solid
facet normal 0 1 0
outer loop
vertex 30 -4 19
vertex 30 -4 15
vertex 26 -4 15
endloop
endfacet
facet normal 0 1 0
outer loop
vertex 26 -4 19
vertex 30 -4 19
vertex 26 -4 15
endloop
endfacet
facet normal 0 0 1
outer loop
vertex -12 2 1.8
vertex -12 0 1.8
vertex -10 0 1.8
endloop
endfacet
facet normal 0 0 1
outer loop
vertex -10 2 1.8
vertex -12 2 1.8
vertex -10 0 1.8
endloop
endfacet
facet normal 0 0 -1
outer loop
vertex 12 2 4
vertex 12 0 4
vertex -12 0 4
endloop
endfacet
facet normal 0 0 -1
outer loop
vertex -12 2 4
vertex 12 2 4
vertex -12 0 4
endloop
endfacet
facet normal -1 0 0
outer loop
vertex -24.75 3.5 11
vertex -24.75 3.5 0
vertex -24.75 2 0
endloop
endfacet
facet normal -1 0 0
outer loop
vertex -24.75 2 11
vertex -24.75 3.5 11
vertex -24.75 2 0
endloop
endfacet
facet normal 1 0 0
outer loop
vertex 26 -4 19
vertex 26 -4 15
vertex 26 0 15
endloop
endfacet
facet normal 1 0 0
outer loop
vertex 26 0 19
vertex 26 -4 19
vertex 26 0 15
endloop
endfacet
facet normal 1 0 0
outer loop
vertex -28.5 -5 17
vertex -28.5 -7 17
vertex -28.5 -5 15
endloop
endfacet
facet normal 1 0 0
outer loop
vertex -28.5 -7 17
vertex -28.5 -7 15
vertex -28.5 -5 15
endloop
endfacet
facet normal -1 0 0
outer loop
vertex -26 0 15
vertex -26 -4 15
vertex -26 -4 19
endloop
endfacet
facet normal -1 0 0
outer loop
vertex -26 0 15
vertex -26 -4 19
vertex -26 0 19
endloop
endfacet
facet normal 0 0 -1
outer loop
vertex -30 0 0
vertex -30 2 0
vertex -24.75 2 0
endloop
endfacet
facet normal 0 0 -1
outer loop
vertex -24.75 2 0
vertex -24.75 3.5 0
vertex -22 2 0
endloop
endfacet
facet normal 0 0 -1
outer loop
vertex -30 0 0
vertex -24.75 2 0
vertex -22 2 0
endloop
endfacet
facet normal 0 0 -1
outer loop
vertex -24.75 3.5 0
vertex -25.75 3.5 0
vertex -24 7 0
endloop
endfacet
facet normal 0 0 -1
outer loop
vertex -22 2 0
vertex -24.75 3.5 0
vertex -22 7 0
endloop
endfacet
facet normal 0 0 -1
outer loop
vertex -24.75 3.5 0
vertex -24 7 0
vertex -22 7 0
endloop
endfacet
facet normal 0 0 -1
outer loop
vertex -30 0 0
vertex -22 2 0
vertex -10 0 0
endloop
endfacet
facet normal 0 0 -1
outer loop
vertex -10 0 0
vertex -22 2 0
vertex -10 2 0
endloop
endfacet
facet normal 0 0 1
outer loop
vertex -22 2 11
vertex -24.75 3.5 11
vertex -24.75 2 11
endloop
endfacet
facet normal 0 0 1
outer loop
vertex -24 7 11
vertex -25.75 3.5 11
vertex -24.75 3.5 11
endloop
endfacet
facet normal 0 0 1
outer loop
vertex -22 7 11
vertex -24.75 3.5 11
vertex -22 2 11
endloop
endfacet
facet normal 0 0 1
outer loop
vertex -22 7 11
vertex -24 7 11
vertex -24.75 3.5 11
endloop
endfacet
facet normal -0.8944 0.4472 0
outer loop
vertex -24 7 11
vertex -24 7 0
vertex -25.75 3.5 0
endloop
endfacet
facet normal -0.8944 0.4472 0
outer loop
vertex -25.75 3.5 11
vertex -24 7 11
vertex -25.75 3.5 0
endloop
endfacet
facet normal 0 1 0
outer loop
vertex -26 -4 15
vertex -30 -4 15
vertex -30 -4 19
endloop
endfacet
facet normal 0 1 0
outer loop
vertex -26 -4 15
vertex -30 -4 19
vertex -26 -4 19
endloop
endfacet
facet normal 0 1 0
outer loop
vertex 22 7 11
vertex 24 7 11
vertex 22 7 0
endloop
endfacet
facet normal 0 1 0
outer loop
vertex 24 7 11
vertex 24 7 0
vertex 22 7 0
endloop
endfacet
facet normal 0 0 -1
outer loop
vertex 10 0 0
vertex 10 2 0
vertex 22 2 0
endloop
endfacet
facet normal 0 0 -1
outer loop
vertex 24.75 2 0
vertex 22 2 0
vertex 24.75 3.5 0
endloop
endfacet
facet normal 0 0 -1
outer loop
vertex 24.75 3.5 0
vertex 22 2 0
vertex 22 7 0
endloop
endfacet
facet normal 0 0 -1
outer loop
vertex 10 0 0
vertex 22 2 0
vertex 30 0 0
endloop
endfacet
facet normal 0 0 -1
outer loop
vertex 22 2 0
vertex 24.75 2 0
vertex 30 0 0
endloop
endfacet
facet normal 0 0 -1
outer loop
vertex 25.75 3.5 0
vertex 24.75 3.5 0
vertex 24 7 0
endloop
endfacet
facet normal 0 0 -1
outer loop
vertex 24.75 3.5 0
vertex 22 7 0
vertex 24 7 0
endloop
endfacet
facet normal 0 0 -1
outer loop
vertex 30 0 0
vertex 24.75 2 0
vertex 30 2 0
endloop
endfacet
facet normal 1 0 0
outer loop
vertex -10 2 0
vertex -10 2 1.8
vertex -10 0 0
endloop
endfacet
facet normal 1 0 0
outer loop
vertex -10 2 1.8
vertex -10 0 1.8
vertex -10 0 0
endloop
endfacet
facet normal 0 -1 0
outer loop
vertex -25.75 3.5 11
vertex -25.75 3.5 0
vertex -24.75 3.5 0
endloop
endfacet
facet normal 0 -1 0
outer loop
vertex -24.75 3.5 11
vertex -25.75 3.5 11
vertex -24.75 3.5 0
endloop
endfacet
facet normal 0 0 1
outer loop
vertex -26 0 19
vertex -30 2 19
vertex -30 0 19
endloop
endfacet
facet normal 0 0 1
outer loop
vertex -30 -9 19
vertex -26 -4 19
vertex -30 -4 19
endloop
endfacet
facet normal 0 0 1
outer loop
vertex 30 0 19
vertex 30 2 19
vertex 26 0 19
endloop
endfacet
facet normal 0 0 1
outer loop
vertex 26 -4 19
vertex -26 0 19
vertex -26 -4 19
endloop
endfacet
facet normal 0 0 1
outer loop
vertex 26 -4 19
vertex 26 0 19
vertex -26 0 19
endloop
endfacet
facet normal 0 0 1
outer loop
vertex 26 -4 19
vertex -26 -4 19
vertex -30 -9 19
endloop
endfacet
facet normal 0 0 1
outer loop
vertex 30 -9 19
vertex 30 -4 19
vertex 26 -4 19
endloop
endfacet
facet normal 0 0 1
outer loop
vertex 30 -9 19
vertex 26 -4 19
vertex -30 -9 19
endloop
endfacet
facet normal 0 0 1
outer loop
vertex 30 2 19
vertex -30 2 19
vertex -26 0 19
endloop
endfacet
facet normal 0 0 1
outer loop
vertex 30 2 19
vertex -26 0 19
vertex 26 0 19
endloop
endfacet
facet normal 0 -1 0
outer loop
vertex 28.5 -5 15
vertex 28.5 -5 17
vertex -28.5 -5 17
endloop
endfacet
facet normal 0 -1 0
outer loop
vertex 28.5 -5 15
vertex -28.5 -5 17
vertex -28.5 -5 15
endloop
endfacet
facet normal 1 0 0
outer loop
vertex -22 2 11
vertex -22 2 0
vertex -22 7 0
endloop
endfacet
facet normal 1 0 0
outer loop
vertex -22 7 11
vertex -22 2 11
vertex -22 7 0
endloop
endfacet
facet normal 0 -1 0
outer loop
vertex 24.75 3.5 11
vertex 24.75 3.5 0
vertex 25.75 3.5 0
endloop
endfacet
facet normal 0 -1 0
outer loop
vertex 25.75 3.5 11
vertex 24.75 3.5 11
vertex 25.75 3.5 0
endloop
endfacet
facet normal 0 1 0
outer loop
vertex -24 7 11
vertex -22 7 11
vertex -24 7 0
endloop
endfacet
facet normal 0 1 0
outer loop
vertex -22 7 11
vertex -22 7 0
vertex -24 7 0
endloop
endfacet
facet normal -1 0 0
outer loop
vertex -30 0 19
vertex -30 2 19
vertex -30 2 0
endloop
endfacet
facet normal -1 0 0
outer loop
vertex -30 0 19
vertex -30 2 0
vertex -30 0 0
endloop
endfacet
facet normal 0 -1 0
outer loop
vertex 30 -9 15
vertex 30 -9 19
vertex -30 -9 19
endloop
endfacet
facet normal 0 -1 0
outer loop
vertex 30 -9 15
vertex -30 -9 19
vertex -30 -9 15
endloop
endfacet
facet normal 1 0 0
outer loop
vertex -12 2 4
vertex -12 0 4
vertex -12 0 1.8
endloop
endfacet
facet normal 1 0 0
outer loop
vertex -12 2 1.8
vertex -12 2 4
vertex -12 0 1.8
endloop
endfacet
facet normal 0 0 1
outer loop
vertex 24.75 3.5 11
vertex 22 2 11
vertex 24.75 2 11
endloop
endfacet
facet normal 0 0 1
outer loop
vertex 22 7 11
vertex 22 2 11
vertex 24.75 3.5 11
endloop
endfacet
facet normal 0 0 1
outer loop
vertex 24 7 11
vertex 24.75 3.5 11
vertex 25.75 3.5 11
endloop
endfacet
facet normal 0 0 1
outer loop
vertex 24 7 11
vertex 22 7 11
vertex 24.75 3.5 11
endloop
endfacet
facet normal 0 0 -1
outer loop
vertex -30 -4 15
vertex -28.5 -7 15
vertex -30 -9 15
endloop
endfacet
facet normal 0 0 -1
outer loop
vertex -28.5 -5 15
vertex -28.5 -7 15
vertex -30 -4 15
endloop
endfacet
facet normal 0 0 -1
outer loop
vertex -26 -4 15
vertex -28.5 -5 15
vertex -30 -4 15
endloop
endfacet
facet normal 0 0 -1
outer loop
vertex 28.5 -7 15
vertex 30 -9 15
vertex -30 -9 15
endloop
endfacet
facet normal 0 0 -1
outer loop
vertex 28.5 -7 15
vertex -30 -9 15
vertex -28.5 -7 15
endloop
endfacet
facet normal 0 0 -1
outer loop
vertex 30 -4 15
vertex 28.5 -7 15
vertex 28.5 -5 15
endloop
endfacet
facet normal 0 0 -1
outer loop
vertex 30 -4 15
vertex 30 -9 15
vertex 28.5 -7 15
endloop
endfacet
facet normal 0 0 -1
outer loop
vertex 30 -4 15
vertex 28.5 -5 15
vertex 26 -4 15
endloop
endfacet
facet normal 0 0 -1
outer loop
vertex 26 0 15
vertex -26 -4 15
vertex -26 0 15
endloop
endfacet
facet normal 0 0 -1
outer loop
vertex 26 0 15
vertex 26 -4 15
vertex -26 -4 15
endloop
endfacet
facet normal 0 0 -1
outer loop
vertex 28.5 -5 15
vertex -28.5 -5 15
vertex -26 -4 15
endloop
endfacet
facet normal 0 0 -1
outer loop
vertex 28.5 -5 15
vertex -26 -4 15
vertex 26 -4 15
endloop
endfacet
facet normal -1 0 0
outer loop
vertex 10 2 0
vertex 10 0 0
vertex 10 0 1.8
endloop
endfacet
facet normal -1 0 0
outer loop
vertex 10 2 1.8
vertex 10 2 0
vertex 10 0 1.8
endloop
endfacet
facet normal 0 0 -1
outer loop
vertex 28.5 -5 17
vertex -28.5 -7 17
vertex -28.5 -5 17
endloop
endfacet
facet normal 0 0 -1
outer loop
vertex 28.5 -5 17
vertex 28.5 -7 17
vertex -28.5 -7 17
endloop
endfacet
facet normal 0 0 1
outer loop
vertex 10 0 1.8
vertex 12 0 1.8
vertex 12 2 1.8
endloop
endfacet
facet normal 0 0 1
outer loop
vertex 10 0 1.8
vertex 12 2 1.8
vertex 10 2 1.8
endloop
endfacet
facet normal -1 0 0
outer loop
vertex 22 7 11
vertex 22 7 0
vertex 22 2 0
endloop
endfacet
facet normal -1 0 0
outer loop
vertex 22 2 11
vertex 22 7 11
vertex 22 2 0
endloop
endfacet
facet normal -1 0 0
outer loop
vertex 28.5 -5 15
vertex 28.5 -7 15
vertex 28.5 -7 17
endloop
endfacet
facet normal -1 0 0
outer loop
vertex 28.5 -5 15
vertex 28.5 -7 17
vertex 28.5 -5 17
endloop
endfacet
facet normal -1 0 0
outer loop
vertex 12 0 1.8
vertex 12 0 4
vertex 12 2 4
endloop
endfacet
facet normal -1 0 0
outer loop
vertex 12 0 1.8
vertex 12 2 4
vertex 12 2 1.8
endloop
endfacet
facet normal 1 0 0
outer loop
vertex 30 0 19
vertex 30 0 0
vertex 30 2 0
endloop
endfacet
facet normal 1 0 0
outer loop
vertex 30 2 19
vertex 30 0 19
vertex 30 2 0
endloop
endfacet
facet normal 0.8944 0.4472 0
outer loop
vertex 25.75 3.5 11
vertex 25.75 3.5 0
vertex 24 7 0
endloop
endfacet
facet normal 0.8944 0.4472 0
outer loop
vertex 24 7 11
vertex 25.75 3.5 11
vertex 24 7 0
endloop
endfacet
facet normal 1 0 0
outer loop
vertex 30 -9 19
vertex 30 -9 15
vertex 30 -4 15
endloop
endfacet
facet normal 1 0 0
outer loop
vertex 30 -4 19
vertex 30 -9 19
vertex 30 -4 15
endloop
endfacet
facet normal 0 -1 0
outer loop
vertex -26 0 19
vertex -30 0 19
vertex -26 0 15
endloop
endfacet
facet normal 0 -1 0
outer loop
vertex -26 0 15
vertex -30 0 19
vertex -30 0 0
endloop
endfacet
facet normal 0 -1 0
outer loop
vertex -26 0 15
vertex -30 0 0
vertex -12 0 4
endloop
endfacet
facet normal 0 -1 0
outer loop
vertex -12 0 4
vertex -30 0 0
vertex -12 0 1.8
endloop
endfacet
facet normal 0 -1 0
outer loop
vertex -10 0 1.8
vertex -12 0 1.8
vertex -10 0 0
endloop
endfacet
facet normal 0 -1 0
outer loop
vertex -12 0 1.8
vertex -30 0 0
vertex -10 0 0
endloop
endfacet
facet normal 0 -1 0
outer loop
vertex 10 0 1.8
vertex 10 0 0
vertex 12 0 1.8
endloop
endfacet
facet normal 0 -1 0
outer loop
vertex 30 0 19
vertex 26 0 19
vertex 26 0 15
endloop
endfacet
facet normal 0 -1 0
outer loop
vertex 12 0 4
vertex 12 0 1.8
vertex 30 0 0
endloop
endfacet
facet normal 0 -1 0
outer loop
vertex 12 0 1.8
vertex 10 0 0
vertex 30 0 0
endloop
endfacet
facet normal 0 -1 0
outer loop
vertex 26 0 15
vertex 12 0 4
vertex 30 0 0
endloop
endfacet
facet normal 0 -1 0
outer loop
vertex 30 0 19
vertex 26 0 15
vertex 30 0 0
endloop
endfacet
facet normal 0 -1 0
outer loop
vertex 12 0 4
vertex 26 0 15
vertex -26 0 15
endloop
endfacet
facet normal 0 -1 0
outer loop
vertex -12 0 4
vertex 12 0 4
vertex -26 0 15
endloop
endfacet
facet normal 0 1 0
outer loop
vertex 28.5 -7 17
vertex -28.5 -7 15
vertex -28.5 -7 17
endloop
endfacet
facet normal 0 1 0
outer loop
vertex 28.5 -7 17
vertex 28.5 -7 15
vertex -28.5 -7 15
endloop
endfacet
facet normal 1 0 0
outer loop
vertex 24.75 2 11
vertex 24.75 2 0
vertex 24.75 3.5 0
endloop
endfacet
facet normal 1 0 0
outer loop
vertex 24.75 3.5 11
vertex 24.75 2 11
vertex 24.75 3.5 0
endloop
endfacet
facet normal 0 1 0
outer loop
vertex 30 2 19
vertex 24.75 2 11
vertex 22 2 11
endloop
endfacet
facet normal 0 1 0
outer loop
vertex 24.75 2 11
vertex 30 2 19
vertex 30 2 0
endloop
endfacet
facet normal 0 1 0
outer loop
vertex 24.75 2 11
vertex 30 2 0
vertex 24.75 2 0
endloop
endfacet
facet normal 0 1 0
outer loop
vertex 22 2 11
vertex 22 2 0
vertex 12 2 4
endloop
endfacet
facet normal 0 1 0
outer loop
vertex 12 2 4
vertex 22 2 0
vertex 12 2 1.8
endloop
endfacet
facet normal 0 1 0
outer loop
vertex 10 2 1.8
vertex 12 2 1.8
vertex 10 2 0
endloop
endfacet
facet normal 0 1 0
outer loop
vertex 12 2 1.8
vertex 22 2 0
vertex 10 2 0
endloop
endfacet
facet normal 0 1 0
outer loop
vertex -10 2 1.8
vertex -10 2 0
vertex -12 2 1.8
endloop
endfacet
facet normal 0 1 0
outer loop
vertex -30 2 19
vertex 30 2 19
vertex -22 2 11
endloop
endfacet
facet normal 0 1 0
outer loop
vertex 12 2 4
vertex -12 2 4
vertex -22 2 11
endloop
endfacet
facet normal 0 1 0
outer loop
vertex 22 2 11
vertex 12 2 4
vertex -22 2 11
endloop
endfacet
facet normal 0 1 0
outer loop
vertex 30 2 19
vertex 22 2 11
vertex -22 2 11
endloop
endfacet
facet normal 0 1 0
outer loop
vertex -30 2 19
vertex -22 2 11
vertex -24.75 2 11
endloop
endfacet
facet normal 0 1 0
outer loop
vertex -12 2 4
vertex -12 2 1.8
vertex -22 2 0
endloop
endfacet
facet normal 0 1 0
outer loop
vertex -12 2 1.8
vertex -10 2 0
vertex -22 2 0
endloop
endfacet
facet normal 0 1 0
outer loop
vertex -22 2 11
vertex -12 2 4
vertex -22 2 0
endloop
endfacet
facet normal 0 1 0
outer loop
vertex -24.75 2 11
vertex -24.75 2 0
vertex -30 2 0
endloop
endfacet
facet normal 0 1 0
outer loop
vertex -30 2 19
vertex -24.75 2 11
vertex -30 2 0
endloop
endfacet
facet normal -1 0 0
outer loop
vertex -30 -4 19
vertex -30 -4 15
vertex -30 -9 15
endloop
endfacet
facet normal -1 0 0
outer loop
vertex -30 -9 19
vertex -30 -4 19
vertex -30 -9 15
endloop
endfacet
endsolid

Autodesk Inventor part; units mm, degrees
ref_plane "YZ Plane" through (0, 0, 0) normal (1, 0, 0) x (0, 1, 0)
ref_plane "XZ Plane" through (0, 0, 0) normal (0, 1, 0) x (-1, 0, 0)
ref_plane "XY Plane" through (0, 0, 0) normal (0, 0, 1) x (1, 0, 0)
sketch "Skizze1" plane through (0, 0, 0) normal (0, 0, 1) x (1, 0, 0)
  line L0 (-30, 0) -> (30, 0)
  line L1 (30, 0) -> (30, 2)
  line L2 (30, 2) -> (24.75, 2)
  line L3 (24.75, 2) -> (24.75, 3.5)
  line L4 (24.75, 3.5) -> (25.75, 3.5)
  line L5 (25.75, 3.5) -> (24, 7)
  line L6 (24, 7) -> (22, 7)
  line L7 (22, 7) -> (22, 2)
  line L8 (22, 2) -> (-22, 2)
  line L9 (-22, 2) -> (-22, 7)
  line L10 (-22, 7) -> (-24, 7)
  line L11 (-24, 7) -> (-25.75, 3.5)
  line L12 (-25.75, 3.5) -> (-24.75, 3.5)
  line L13 (-24.75, 3.5) -> (-24.75, 2)
  line L14 (-24.75, 2) -> (-30, 2)
  line L15 (-30, 2) -> (-30, 0)
  point P0 (0, 0)
  point P1 (0, 0)
  dimension "d0" = 49.5
  dimension "d1" = 24.75
  dimension "d2" = 5.25
  dimension "d3" = 5.25
  dimension "d4" = 1
  dimension "d5" = 1
  dimension "d6" = 44
  dimension "d7" = 2
  dimension "d8" = 22
  dimension "d9" = 2
  dimension "d10" = 5
  dimension "d11" = 2
  dimension "d12" = 2
  dimension "d13" = 1.5
extrude "Extrusion1" add sketch "Skizze1" along normal blind 11
sketch "Skizze2" plane through (30, 0, 0) normal (1, 0, 0) x (0, 0, -1)
  line L0 (-11, 0) -> (-11, 2) projected
  line L1 (-19, 0) -> (-19, -9)
  line L2 (-19, -9) -> (-15, -9)
  line L3 (-15, -9) -> (-15, -7)
  line L4 (-15, -7) -> (-17, -7)
  line L5 (-17, -7) -> (-17, -5)
  line L6 (-17, -5) -> (-15, -5)
  line L7 (-15, -5) -> (-15, 0)
  line L8 (0, 0) -> (-11, 0) projected
  line L9 (-11, 2) -> (-11, 0) projected
  line L10 (-15, 0) -> (-11, 0)
  line L11 (-11, 2) -> (-11, 7) projected
  line L12 (-11, 0) -> (-11, 2)
  line L13 (-11, 2) -> (-19, 2)
  line L14 (-19, 2) -> (-19, 0)
  point P0 (-11, 1)
  dimension "d16" = 9
  dimension "d17" = 4
  dimension "d18" = 2
  dimension "d19" = 2
  dimension "d20" = 2
  dimension "d23" = 4
  dimension "d24" = 2
extrude "Extrusion2" add sketch "Skizze2" against normal up to surface (60 mm away)
sketch "Skizze3" plane through (30, -5, 15) normal (0, 0, -1) x (-1, 0, 0)
  line L0 (60, 7) -> (60, -4) projected
  line L1 (0, 0) -> (60, 0) projected
  line L2 (60, -4) -> (58.5, -4)
  line L3 (58.5, -4) -> (58.5, 0)
  line L4 (58.5, 0) -> (60, 0)
  line L5 (60, 0) -> (60, -4)
  line L6 (0, 7) -> (0, -4) projected
  line L7 (0, -4) -> (1.5, -4)
  line L8 (1.5, -4) -> (1.5, 0)
  line L9 (1.5, 0) -> (0, 0)
  line L10 (0, 0) -> (0, -4)
  line L11 (60, 5) -> (0, 5) projected
  point P0 (30, 5)
  point P1 (30, 5)
  point P2 (1.5, 0)
  dimension "d25" = 57
  dimension "d26" = 28.5
extrude "Extrusion3" add sketch "Skizze3" against normal up to surface (2 mm away) contours L0 L2 L3 L1 | L1 L8 L7 L6
sketch "Skizze4" plane through (-30, 0, 0) normal (0, -1, 0) x (1, 0, 0)
  line L0 (52, 0) -> (8, 0) projected
  line L1 (20, 0) -> (40, 0)
  line L2 (40, 0) -> (40, 4)
  line L3 (40, 4) -> (20, 4)
  line L4 (20, 4) -> (20, 0)
  line L5 (20, 4) -> (18, 4)
  line L6 (18, 4) -> (18, 1.8)
  line L7 (18, 1.8) -> (20, 1.8)
  line L8 (20, 1.8) -> (20, 4)
  line L9 (40, 4) -> (42, 4)
  line L10 (42, 4) -> (42, 1.8)
  line L11 (42, 1.8) -> (40, 1.8)
  line L12 (40, 1.8) -> (40, 4)
  point P0 (30, 0)
  point P1 (40, 2.9)
  point P2 (41, 1.8)
  point P3 (30, 0)
  dimension "d29" = 20
  dimension "d30" = 2
  dimension "d31" = 2
  dimension "d32" = 2.2
  dimension "d33" = 1.8
  dimension "d34" = 10
extrude "Extrusion4" cut sketch "Skizze4" against normal blind 10
sketch "Skizze5" plane through (30, -9, 15) normal (0, 0, -1) x (-1, 0, 0)
  line L0 (0, 11) -> (0, 0) projected
  line L1 (0, 9) -> (60, 9) projected
  line L2 (0, 5) -> (4, 5)
  line L3 (4, 5) -> (4, 9)
  line L4 (4, 9) -> (0, 9)
  line L5 (0, 9) -> (0, 5)
  line L6 (60, 0) -> (60, 9) projected
  line L7 (60, 5) -> (56, 5)
  line L8 (56, 5) -> (56, 9)
  line L9 (56, 9) -> (60, 9)
  line L10 (60, 9) -> (60, 5)
  point P0 (30, 9)
  dimension "d37" = 4
  dimension "d38" = 4
  dimension "d39" = 4
extrude "Extrusion5" cut sketch "Skizze5" against normal blind 10
equation "\"d1\" = 0.5 * d0"
equation "\"d3\" = d2"
equation "\"d5\" = d4"
equation "\"d8\" = 0.5 * d6"
equation "\"d9\" = d7"
equation "\"d26\" = 0.5 * d25"
equation "\"d31\" = d30"
equation "\"d34\" = 0.5 * d29"
equation "\"d38\" = d37"
equation "\"d39\" = d37"
properties part number "Clip"
